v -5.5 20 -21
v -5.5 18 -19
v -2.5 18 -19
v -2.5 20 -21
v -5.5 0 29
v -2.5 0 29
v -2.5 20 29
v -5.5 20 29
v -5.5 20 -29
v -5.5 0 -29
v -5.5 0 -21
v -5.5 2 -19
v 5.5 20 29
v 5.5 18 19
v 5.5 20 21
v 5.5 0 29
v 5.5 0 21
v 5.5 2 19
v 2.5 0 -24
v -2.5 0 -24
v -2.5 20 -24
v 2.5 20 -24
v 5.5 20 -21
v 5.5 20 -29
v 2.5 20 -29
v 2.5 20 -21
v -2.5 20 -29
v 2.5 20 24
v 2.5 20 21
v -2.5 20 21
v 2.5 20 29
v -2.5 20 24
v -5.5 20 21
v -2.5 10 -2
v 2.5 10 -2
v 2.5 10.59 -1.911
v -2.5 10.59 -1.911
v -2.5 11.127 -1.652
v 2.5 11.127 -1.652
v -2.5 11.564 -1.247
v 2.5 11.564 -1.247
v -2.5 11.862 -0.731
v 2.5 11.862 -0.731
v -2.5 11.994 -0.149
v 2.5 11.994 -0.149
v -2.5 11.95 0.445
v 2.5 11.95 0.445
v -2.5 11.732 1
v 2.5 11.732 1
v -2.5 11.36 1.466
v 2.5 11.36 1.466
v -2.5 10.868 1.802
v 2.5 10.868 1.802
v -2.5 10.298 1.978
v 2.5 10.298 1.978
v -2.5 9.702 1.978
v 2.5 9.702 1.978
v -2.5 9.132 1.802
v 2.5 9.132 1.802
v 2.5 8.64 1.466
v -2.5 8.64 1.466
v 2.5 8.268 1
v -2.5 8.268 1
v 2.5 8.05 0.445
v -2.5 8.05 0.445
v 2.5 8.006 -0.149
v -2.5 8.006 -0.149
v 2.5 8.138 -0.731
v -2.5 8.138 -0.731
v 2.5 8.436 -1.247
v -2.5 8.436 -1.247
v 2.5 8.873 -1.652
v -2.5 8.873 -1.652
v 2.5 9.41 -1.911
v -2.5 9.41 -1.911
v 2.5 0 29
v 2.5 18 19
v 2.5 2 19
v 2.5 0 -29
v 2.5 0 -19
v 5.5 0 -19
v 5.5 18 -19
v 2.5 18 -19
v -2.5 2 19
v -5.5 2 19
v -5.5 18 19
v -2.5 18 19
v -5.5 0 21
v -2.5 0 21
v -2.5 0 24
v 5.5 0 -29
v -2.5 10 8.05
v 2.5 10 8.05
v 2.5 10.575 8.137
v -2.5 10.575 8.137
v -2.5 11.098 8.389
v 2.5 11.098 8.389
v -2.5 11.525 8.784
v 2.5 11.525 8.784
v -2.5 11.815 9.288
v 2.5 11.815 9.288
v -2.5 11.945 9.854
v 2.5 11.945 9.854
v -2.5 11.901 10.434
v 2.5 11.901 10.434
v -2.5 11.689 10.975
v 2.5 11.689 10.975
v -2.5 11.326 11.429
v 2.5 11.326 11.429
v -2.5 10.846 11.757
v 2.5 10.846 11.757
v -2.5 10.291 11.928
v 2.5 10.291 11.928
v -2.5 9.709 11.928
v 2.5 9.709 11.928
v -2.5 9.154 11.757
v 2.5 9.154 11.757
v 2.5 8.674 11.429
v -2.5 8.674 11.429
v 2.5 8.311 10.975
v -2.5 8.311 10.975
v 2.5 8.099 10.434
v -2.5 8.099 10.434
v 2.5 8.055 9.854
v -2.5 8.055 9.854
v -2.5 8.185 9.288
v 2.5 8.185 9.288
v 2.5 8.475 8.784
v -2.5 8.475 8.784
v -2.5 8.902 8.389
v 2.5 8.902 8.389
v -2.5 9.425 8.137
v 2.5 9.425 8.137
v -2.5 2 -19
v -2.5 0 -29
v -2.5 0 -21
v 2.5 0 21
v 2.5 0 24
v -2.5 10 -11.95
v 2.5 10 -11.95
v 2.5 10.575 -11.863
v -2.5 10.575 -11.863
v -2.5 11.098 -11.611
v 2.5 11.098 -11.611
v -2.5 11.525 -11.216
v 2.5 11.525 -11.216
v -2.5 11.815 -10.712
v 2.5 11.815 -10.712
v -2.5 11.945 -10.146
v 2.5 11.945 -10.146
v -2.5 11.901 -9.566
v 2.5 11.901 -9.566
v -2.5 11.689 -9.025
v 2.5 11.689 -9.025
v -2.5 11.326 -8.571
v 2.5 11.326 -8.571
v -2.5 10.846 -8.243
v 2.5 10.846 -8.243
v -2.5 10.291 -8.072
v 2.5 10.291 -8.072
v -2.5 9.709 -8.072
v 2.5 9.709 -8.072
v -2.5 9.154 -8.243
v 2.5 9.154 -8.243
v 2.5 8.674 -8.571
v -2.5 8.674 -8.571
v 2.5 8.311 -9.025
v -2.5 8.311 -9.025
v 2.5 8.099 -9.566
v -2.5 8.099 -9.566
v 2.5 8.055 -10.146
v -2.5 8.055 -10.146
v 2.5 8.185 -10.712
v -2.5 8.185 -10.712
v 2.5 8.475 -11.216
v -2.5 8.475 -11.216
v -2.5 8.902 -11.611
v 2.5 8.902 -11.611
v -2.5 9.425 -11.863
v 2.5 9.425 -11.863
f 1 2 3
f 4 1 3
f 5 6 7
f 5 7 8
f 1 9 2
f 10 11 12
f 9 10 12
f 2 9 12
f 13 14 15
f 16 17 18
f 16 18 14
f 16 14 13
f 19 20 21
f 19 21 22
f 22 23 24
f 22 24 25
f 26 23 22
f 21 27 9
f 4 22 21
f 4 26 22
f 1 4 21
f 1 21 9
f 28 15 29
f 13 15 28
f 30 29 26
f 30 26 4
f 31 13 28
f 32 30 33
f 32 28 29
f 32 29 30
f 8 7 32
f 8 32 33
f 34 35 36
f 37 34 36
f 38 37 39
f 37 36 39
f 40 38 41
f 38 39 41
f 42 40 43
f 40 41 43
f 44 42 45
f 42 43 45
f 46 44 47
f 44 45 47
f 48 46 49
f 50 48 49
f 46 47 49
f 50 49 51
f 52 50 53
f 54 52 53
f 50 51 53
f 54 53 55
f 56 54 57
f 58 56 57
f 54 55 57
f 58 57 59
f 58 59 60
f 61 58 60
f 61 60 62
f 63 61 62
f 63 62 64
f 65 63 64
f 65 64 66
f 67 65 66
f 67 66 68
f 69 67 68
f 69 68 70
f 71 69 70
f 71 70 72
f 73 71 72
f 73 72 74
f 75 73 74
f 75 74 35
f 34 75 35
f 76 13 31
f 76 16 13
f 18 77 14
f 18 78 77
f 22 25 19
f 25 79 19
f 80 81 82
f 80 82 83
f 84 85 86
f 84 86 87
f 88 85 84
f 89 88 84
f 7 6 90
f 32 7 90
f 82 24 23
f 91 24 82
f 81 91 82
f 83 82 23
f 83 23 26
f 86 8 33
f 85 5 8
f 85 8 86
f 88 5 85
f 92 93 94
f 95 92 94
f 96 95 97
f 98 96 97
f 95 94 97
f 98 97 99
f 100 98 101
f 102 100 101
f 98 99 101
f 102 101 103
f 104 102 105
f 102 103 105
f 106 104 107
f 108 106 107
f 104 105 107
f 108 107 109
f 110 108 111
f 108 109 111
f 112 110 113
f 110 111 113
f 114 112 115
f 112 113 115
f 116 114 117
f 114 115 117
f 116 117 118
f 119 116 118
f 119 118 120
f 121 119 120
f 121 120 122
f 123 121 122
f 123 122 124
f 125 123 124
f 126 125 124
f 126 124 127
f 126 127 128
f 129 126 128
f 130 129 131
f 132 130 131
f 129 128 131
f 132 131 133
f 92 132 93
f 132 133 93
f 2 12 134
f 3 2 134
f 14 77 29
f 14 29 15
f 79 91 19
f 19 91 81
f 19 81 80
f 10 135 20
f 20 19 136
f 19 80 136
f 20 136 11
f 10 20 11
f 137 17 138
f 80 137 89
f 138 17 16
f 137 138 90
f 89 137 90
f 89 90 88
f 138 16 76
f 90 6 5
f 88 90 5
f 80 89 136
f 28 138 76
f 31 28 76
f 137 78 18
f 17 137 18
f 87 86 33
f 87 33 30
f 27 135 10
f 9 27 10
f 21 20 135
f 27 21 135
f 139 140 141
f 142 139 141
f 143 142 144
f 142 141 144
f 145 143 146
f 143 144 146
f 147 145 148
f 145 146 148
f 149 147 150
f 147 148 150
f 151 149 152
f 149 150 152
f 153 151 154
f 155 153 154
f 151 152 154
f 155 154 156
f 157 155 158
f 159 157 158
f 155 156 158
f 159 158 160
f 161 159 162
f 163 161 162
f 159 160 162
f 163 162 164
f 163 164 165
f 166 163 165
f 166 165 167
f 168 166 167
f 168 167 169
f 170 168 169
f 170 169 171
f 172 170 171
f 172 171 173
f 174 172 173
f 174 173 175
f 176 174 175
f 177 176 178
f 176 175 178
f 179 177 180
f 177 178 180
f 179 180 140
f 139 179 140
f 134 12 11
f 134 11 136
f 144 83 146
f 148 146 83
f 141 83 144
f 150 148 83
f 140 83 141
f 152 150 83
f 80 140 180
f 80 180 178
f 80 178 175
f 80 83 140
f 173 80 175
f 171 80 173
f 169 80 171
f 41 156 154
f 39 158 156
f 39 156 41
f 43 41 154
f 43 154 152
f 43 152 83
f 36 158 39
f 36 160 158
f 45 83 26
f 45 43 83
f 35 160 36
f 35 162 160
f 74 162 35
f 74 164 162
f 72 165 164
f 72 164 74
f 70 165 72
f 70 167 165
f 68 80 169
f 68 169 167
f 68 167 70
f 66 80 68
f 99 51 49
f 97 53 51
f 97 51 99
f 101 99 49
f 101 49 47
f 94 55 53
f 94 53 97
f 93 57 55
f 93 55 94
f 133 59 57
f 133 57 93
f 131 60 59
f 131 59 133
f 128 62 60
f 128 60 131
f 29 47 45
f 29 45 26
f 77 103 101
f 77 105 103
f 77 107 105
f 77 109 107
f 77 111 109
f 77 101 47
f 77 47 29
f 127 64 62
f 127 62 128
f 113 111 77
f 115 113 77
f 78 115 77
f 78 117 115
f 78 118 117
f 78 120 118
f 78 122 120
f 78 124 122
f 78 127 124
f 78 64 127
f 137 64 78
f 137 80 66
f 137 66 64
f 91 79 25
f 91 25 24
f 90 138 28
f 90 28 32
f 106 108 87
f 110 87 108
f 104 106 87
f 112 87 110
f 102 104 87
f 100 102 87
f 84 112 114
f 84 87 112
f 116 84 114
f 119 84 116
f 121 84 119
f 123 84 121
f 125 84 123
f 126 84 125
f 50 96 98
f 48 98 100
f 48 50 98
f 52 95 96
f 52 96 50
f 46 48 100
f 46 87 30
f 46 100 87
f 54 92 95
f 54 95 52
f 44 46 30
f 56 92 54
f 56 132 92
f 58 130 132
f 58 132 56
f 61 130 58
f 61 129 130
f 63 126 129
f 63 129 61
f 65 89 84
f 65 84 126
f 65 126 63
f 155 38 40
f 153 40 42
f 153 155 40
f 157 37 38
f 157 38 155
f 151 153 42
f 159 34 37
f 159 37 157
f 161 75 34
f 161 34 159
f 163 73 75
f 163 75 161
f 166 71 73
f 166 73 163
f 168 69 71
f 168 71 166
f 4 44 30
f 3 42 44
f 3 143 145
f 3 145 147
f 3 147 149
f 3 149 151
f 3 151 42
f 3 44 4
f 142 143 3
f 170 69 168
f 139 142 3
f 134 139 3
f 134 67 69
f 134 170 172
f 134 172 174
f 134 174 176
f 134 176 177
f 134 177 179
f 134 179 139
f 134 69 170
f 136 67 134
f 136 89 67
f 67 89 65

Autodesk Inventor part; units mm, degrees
ref_plane "YZ Plane" through (0, 0, 0) normal (1, 0, 0) x (0, 1, 0)
ref_plane "XZ Plane" through (0, 0, 0) normal (0, 1, 0) x (-1, 0, 0)
ref_plane "XY Plane" through (0, 0, 0) normal (0, 0, 1) x (1, 0, 0)
sketch "Эскиз1" plane through (0, 0, 0) normal (0, 1, 0) x (-1, 0, 0)
  line L0 (-2.5, 24) -> (2.5, 24)
  line L1 (2.5, 24) -> (2.5, -24)
  line L2 (2.5, -24) -> (-2.5, -24)
  line L3 (-2.5, -24) -> (-2.5, 24)
  line L4 (-2.5, 29) -> (2.5, 29)
  line L5 (2.5, 29) -> (2.5, -29)
  line L6 (2.5, -29) -> (-2.5, -29)
  line L7 (-2.5, -29) -> (-2.5, 29)
  line L8 (2.5, 29) -> (5.5, 29)
  line L9 (5.5, 29) -> (5.5, 19)
  line L10 (5.5, 19) -> (2.5, 19)
  line L11 (2.5, 19) -> (2.5, 29)
  line L12 (-2.5, 19) -> (-5.5, 19)
  line L13 (-5.5, 19) -> (-5.5, 29)
  line L14 (-5.5, 29) -> (-2.5, 29)
  line L15 (-2.5, 29) -> (-2.5, 19)
  line L16 (2.5, -29) -> (5.5, -29)
  line L17 (5.5, -29) -> (5.5, -19)
  line L18 (5.5, -19) -> (2.5, -19)
  line L19 (2.5, -19) -> (2.5, -29)
  line L20 (-2.5, -29) -> (-5.5, -29)
  line L21 (-5.5, -29) -> (-5.5, -19)
  line L22 (-5.5, -19) -> (-2.5, -19)
  line L23 (-2.5, -19) -> (-2.5, -29)
  point P0 (0, 0)
  dimension "d3" = 3
  dimension "d4" = 10
  dimension "d5" = 3
  dimension "d6" = 10
  dimension "d7" = 3
  dimension "d8" = 10
  dimension "d9" = 3
  dimension "d10" = 10
extrude "Выдавливание1" add sketch "Эскиз1" along normal blind 20 contours L0 L1 L2 L3 | L3 L12 L13 L14 L7 | L5 L8 L9 L10 L1 | L3 L7 L20 L21 L22 | L18 L17 L16 L5 L1
sketch "Эскиз2" plane through (2.5, 0, 19) normal (1, 0, 0) x (0, 0, -1)
  line L0 (19, 0) -> (19, 20)
  line L1 (0, 20) -> (38, 20) projected
  circle A0 centre (19, 10) radius 2
  dimension "d13" = 4
extrude "Выдавливание2" cut sketch "Эскиз2" against normal blind 35
chamfer "Фаска1" distance 2 angle 45 7 edges at (-4, 20, -19) (-4, 0, -19) (4, 20, -19) (4, 20, 19) (-4, 20, 19) (-4, 0, 19) (4, 0, 19)
sketch "Эскиз3" plane through (2.5, 0, -19) normal (1, 0, 0) x (0, 0, -1)
  circle A0 centre (-19, 10) radius 2 projected
  line L0 (-19, 10) -> (-9, 10)
  line L1 (-19, 10) -> (-29, 10)
  circle A1 centre (-29, 10) radius 1.95
  circle A2 centre (-9, 10) radius 1.95
  point P0 (-19, 0)
  dimension "d19" = 10
  dimension "d20" = 10
  dimension "d21" = 3.9
  dimension "d22" = 3.9
extrude "Выдавливание3" cut sketch "Эскиз3" against normal blind 22 contours A1 | A2
properties part number "МД.001.1003 - Каретка" material "Пластик АБС"
